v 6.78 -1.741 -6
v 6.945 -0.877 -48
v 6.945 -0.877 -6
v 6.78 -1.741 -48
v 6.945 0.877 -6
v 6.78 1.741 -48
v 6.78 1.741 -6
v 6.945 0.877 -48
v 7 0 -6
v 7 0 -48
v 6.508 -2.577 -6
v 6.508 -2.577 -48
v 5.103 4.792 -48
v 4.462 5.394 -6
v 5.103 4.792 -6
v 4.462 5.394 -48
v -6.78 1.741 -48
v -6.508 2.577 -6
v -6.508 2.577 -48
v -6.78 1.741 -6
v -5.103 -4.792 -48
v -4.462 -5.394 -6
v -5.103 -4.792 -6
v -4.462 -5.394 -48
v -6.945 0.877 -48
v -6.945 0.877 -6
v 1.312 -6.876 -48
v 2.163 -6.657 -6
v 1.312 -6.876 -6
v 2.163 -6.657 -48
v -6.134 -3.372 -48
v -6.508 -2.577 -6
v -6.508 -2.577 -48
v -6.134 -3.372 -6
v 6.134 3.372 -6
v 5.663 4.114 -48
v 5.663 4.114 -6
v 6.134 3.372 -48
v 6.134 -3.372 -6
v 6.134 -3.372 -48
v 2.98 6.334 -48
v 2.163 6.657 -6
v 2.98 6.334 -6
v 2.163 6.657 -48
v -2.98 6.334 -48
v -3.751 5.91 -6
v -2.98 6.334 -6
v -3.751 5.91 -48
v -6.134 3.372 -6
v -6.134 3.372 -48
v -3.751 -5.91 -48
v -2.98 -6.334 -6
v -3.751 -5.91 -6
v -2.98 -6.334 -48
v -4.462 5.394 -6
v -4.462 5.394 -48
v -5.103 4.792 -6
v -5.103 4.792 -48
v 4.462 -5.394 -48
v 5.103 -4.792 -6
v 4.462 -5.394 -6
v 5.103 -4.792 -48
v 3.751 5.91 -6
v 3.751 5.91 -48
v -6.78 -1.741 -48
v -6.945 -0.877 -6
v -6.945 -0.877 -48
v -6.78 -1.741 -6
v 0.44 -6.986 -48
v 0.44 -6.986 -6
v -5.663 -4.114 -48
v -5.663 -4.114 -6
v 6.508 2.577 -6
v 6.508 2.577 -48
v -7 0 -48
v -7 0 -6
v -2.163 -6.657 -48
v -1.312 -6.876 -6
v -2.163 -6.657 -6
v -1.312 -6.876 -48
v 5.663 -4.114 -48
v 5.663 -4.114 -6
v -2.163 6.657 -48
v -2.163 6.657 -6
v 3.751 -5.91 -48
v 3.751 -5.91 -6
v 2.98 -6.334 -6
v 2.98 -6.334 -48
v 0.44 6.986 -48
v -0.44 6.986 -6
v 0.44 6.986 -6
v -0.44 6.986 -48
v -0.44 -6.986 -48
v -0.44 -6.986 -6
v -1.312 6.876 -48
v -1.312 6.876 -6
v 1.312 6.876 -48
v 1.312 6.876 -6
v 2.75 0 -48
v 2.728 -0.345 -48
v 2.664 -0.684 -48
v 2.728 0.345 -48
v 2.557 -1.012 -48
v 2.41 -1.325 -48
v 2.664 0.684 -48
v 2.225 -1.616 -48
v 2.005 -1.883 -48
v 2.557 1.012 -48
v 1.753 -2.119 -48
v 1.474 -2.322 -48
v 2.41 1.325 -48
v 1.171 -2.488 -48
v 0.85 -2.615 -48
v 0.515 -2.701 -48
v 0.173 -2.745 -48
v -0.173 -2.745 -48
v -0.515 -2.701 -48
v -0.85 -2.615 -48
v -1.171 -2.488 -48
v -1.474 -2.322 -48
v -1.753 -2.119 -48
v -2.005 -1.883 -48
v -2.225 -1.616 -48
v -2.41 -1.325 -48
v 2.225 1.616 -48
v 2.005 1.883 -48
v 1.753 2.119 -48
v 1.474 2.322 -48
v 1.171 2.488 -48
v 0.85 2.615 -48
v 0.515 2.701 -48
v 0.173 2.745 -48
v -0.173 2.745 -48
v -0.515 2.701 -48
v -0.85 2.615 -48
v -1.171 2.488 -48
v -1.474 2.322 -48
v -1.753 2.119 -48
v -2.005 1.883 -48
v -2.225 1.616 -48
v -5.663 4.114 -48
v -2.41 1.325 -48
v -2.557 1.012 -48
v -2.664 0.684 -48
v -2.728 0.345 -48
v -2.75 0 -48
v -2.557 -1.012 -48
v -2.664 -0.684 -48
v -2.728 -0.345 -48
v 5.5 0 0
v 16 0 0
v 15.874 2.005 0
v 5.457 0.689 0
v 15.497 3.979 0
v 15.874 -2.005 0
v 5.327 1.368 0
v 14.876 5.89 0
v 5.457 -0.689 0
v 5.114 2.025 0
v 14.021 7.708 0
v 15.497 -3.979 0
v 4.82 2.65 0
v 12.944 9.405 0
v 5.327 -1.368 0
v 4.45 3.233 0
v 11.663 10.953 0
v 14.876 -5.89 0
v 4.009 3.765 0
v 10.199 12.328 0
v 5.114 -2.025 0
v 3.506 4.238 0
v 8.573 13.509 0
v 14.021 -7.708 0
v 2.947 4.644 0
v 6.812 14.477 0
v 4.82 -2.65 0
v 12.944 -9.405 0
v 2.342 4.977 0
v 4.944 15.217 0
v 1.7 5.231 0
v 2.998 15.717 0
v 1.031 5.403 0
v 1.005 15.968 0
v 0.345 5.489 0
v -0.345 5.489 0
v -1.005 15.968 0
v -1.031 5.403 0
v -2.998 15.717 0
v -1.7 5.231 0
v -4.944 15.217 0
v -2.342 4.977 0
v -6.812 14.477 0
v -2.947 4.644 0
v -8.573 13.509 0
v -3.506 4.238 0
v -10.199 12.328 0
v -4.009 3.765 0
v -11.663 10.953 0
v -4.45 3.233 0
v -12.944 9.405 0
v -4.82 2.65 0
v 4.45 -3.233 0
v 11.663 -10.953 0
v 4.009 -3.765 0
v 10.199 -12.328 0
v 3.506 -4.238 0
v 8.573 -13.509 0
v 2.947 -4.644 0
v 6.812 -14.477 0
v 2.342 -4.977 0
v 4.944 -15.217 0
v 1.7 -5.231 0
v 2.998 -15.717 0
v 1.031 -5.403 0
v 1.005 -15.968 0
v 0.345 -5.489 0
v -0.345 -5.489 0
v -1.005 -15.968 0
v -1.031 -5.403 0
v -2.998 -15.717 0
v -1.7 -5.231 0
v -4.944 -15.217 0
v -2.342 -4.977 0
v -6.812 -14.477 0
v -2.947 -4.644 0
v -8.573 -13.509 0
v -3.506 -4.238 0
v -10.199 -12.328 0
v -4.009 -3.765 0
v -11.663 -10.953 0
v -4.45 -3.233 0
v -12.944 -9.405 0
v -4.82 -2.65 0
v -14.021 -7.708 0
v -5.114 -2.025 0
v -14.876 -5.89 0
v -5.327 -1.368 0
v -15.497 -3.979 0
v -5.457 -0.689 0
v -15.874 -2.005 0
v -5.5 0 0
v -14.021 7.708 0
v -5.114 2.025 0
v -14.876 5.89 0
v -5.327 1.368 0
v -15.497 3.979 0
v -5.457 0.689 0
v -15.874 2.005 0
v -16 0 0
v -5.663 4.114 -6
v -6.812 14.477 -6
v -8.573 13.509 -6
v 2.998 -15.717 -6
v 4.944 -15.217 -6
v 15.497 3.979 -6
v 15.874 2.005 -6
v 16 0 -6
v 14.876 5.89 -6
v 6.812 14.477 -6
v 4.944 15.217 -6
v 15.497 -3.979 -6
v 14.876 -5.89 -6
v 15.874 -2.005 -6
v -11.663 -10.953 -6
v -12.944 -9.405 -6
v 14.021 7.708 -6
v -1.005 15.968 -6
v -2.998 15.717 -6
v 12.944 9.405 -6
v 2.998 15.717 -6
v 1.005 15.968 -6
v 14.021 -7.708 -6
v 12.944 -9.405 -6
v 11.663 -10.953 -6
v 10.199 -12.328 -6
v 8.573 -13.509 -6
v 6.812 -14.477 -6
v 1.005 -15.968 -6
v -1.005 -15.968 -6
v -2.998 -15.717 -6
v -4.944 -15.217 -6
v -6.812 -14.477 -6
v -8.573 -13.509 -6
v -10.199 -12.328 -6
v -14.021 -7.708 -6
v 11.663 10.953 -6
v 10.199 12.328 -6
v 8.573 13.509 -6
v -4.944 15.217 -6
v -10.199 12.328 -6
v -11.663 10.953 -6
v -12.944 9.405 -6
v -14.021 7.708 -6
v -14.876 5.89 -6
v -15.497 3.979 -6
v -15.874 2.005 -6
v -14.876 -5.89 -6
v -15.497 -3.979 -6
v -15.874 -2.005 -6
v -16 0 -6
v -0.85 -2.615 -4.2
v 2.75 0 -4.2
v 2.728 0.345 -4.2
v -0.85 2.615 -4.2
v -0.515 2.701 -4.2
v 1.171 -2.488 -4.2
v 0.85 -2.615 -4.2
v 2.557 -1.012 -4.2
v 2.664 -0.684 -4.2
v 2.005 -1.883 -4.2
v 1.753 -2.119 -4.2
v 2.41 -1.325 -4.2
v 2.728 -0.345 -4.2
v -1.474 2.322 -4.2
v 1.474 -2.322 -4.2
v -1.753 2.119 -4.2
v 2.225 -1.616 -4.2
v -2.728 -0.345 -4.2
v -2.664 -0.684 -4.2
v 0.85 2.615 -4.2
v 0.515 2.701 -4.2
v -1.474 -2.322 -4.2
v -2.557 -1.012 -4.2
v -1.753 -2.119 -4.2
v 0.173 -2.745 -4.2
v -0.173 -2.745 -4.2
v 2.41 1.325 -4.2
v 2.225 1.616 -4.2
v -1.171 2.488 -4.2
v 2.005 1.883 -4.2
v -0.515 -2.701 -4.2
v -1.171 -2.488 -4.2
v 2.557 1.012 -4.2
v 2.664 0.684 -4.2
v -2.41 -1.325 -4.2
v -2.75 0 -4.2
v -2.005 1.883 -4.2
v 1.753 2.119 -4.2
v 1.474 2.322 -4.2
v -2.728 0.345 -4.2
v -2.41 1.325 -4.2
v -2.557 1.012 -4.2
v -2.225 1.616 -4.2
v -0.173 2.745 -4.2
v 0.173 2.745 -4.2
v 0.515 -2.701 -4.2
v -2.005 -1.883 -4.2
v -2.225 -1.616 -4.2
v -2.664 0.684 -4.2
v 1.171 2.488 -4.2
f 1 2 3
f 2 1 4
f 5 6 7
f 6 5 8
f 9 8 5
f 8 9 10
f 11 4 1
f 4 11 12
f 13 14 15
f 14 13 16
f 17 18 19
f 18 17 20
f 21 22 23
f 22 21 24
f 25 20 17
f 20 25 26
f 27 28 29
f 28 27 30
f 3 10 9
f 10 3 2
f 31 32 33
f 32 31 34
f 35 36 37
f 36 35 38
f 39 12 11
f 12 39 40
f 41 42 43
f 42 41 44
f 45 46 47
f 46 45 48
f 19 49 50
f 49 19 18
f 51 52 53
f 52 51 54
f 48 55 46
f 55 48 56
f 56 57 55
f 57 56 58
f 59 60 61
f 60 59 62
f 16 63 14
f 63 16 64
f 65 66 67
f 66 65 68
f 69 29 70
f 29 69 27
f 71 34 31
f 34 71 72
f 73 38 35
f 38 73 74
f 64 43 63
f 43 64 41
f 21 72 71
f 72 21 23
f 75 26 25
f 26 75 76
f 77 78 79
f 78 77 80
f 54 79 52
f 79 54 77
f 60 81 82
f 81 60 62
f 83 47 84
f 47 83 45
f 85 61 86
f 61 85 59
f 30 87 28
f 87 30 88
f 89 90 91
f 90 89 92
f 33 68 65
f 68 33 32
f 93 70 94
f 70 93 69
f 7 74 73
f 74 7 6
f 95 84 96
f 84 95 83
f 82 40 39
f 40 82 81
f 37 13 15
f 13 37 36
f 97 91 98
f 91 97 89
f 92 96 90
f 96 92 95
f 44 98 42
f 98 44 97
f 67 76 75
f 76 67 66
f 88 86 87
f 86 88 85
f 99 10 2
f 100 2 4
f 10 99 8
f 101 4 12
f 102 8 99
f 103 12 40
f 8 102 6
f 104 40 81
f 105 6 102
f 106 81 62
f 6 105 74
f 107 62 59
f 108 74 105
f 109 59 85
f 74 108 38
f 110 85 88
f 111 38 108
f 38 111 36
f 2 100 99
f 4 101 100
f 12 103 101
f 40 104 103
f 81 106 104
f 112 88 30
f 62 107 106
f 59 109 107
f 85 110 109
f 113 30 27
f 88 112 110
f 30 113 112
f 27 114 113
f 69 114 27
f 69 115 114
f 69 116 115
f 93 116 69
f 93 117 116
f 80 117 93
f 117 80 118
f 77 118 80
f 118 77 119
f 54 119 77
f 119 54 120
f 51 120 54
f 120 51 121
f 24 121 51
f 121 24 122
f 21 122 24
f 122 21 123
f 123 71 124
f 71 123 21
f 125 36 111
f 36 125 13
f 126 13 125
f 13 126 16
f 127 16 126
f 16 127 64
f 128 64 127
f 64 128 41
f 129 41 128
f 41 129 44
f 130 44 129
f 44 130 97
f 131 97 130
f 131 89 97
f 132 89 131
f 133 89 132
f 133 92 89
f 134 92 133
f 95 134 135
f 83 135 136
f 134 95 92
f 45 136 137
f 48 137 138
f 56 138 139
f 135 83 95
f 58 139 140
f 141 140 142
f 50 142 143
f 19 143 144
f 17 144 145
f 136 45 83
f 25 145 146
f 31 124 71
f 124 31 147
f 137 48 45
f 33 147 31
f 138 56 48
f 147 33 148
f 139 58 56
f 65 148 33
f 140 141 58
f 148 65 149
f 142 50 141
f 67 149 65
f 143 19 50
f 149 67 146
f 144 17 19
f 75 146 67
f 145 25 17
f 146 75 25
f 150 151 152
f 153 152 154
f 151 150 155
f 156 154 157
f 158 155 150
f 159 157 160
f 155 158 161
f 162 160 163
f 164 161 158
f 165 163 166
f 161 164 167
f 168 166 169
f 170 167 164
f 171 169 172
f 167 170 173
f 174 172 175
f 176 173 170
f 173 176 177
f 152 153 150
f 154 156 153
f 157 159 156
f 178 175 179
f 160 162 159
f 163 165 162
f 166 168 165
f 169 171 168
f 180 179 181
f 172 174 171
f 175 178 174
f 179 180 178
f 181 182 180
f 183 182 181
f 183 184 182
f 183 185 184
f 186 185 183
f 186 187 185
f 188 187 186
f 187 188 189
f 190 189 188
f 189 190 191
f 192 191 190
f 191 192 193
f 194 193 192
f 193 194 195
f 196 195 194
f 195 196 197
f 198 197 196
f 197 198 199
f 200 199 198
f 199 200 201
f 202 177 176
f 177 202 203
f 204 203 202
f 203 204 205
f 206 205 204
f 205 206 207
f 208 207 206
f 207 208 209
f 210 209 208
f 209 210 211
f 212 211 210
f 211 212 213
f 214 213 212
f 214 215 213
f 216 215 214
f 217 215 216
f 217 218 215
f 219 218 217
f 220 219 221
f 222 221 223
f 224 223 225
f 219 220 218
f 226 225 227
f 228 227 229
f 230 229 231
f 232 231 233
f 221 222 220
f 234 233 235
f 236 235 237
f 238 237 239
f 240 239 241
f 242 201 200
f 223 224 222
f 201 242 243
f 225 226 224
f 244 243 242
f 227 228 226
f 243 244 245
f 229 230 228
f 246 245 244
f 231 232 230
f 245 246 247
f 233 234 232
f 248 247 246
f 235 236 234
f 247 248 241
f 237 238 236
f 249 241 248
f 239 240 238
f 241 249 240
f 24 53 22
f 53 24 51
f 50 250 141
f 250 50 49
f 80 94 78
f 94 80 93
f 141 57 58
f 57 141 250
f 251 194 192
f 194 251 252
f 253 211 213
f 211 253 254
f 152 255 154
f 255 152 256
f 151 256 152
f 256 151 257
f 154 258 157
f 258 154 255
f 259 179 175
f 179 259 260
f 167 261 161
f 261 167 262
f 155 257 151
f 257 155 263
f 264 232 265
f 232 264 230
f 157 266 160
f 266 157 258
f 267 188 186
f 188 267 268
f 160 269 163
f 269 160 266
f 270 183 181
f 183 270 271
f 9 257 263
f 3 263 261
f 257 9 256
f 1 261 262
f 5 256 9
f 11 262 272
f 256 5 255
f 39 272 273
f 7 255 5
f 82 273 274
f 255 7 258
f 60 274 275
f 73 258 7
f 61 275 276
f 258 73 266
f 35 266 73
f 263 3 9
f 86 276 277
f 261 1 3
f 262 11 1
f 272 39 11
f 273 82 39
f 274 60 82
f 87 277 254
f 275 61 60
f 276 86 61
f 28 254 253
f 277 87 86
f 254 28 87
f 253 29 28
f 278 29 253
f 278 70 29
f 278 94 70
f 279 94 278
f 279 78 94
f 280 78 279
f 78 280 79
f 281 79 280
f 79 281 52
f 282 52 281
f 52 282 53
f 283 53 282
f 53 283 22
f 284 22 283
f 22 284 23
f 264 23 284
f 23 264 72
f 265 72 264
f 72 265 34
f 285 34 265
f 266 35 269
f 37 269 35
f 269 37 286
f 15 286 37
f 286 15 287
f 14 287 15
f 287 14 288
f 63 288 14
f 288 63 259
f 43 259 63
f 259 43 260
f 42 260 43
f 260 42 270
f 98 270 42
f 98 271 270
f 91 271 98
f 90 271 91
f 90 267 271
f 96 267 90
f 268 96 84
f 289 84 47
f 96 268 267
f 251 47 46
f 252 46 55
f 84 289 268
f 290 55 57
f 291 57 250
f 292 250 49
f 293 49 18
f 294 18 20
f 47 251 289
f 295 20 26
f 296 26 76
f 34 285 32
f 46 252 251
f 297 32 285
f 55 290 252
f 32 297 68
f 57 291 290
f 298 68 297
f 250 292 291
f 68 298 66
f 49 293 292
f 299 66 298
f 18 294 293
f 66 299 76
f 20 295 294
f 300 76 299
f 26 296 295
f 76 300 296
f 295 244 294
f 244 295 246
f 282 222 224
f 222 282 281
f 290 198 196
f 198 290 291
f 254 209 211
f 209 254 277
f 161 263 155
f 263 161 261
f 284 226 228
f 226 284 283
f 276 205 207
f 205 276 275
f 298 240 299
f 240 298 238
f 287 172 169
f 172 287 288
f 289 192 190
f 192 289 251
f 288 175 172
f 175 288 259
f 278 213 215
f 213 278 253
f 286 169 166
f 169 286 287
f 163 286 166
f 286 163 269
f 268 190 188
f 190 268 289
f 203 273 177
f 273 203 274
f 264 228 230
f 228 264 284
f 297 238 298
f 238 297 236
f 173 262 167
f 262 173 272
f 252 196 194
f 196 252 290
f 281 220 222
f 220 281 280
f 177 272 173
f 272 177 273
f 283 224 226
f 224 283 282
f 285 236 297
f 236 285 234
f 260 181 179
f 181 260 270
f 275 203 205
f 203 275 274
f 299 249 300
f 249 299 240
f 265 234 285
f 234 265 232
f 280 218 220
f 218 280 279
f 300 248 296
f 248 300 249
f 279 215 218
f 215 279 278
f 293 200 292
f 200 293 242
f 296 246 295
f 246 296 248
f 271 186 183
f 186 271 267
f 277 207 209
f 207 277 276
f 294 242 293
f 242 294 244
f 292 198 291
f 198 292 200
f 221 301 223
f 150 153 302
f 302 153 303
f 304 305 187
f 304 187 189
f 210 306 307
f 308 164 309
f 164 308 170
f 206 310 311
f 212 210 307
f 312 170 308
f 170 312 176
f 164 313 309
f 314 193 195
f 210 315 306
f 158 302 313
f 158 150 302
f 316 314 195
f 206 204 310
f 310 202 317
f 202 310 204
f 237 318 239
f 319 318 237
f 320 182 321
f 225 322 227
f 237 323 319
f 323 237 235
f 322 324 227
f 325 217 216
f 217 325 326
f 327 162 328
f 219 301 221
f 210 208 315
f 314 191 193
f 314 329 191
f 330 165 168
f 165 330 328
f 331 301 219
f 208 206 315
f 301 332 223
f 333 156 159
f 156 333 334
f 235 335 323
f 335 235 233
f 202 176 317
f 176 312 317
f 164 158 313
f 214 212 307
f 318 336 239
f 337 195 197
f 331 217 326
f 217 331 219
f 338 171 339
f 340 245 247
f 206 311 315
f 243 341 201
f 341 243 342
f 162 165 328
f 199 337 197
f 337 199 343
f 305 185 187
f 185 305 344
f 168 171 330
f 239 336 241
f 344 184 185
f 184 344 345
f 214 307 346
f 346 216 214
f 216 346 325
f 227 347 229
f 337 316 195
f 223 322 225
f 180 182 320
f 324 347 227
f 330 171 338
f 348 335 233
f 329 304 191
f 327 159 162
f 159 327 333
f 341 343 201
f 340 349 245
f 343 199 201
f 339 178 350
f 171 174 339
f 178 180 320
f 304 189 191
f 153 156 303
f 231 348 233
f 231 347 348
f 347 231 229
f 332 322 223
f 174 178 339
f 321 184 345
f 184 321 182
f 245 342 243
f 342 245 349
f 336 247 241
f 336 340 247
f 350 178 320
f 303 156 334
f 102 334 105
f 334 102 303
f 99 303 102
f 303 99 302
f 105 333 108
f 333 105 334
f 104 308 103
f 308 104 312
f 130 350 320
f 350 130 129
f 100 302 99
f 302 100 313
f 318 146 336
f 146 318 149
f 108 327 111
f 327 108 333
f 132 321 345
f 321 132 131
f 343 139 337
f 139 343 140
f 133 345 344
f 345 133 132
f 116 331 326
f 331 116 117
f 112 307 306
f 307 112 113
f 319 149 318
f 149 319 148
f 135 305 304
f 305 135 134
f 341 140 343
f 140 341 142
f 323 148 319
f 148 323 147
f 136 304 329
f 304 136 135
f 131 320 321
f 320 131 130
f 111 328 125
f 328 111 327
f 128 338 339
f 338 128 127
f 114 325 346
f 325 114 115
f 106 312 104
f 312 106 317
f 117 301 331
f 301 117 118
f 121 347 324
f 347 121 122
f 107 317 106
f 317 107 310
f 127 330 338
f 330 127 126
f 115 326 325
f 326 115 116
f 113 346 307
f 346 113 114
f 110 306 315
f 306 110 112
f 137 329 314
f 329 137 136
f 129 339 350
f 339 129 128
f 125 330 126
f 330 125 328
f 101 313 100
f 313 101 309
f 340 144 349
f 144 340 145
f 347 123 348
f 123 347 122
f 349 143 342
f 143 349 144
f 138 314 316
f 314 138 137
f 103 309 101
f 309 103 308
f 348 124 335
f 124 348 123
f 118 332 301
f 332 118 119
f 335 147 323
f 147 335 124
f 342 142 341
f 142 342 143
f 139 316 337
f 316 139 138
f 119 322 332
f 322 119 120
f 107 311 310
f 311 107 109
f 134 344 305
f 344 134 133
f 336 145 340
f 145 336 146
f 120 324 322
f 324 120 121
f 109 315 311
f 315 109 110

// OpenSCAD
$fn = 50;


difference() {
	union() {
		translate(v = [0, 0, -48.0000000000]) {
			cylinder(h = 48, r = 7.0000000000);
		}
		translate(v = [0, 0, -6.0000000000]) {
			cylinder(h = 6, r = 16.0000000000);
		}
	}
	union() {
		translate(v = [0, 0, 0]) {
			rotate(a = [0, 0, 0]) {
				difference() {
					union() {
						#translate(v = [0, 0, -48.0000000000]) {
							cylinder(h = 48, r = 2.2500000000);
						}
						#translate(v = [0, 0, -4.2000000000]) {
							cylinder(h = 4.2000000000, r = 7.0000000000, r1 = 2.7500000000, r2 = 5.5000000000);
						}
						#translate(v = [0, 0, -48.0000000000]) {
							cylinder(h = 48, r = 2.7500000000);
						}
						#translate(v = [0, 0, -48.0000000000]) {
							cylinder(h = 48, r = 2.2500000000);
						}
					}
					union();
				}
			}
		}
	}
}
